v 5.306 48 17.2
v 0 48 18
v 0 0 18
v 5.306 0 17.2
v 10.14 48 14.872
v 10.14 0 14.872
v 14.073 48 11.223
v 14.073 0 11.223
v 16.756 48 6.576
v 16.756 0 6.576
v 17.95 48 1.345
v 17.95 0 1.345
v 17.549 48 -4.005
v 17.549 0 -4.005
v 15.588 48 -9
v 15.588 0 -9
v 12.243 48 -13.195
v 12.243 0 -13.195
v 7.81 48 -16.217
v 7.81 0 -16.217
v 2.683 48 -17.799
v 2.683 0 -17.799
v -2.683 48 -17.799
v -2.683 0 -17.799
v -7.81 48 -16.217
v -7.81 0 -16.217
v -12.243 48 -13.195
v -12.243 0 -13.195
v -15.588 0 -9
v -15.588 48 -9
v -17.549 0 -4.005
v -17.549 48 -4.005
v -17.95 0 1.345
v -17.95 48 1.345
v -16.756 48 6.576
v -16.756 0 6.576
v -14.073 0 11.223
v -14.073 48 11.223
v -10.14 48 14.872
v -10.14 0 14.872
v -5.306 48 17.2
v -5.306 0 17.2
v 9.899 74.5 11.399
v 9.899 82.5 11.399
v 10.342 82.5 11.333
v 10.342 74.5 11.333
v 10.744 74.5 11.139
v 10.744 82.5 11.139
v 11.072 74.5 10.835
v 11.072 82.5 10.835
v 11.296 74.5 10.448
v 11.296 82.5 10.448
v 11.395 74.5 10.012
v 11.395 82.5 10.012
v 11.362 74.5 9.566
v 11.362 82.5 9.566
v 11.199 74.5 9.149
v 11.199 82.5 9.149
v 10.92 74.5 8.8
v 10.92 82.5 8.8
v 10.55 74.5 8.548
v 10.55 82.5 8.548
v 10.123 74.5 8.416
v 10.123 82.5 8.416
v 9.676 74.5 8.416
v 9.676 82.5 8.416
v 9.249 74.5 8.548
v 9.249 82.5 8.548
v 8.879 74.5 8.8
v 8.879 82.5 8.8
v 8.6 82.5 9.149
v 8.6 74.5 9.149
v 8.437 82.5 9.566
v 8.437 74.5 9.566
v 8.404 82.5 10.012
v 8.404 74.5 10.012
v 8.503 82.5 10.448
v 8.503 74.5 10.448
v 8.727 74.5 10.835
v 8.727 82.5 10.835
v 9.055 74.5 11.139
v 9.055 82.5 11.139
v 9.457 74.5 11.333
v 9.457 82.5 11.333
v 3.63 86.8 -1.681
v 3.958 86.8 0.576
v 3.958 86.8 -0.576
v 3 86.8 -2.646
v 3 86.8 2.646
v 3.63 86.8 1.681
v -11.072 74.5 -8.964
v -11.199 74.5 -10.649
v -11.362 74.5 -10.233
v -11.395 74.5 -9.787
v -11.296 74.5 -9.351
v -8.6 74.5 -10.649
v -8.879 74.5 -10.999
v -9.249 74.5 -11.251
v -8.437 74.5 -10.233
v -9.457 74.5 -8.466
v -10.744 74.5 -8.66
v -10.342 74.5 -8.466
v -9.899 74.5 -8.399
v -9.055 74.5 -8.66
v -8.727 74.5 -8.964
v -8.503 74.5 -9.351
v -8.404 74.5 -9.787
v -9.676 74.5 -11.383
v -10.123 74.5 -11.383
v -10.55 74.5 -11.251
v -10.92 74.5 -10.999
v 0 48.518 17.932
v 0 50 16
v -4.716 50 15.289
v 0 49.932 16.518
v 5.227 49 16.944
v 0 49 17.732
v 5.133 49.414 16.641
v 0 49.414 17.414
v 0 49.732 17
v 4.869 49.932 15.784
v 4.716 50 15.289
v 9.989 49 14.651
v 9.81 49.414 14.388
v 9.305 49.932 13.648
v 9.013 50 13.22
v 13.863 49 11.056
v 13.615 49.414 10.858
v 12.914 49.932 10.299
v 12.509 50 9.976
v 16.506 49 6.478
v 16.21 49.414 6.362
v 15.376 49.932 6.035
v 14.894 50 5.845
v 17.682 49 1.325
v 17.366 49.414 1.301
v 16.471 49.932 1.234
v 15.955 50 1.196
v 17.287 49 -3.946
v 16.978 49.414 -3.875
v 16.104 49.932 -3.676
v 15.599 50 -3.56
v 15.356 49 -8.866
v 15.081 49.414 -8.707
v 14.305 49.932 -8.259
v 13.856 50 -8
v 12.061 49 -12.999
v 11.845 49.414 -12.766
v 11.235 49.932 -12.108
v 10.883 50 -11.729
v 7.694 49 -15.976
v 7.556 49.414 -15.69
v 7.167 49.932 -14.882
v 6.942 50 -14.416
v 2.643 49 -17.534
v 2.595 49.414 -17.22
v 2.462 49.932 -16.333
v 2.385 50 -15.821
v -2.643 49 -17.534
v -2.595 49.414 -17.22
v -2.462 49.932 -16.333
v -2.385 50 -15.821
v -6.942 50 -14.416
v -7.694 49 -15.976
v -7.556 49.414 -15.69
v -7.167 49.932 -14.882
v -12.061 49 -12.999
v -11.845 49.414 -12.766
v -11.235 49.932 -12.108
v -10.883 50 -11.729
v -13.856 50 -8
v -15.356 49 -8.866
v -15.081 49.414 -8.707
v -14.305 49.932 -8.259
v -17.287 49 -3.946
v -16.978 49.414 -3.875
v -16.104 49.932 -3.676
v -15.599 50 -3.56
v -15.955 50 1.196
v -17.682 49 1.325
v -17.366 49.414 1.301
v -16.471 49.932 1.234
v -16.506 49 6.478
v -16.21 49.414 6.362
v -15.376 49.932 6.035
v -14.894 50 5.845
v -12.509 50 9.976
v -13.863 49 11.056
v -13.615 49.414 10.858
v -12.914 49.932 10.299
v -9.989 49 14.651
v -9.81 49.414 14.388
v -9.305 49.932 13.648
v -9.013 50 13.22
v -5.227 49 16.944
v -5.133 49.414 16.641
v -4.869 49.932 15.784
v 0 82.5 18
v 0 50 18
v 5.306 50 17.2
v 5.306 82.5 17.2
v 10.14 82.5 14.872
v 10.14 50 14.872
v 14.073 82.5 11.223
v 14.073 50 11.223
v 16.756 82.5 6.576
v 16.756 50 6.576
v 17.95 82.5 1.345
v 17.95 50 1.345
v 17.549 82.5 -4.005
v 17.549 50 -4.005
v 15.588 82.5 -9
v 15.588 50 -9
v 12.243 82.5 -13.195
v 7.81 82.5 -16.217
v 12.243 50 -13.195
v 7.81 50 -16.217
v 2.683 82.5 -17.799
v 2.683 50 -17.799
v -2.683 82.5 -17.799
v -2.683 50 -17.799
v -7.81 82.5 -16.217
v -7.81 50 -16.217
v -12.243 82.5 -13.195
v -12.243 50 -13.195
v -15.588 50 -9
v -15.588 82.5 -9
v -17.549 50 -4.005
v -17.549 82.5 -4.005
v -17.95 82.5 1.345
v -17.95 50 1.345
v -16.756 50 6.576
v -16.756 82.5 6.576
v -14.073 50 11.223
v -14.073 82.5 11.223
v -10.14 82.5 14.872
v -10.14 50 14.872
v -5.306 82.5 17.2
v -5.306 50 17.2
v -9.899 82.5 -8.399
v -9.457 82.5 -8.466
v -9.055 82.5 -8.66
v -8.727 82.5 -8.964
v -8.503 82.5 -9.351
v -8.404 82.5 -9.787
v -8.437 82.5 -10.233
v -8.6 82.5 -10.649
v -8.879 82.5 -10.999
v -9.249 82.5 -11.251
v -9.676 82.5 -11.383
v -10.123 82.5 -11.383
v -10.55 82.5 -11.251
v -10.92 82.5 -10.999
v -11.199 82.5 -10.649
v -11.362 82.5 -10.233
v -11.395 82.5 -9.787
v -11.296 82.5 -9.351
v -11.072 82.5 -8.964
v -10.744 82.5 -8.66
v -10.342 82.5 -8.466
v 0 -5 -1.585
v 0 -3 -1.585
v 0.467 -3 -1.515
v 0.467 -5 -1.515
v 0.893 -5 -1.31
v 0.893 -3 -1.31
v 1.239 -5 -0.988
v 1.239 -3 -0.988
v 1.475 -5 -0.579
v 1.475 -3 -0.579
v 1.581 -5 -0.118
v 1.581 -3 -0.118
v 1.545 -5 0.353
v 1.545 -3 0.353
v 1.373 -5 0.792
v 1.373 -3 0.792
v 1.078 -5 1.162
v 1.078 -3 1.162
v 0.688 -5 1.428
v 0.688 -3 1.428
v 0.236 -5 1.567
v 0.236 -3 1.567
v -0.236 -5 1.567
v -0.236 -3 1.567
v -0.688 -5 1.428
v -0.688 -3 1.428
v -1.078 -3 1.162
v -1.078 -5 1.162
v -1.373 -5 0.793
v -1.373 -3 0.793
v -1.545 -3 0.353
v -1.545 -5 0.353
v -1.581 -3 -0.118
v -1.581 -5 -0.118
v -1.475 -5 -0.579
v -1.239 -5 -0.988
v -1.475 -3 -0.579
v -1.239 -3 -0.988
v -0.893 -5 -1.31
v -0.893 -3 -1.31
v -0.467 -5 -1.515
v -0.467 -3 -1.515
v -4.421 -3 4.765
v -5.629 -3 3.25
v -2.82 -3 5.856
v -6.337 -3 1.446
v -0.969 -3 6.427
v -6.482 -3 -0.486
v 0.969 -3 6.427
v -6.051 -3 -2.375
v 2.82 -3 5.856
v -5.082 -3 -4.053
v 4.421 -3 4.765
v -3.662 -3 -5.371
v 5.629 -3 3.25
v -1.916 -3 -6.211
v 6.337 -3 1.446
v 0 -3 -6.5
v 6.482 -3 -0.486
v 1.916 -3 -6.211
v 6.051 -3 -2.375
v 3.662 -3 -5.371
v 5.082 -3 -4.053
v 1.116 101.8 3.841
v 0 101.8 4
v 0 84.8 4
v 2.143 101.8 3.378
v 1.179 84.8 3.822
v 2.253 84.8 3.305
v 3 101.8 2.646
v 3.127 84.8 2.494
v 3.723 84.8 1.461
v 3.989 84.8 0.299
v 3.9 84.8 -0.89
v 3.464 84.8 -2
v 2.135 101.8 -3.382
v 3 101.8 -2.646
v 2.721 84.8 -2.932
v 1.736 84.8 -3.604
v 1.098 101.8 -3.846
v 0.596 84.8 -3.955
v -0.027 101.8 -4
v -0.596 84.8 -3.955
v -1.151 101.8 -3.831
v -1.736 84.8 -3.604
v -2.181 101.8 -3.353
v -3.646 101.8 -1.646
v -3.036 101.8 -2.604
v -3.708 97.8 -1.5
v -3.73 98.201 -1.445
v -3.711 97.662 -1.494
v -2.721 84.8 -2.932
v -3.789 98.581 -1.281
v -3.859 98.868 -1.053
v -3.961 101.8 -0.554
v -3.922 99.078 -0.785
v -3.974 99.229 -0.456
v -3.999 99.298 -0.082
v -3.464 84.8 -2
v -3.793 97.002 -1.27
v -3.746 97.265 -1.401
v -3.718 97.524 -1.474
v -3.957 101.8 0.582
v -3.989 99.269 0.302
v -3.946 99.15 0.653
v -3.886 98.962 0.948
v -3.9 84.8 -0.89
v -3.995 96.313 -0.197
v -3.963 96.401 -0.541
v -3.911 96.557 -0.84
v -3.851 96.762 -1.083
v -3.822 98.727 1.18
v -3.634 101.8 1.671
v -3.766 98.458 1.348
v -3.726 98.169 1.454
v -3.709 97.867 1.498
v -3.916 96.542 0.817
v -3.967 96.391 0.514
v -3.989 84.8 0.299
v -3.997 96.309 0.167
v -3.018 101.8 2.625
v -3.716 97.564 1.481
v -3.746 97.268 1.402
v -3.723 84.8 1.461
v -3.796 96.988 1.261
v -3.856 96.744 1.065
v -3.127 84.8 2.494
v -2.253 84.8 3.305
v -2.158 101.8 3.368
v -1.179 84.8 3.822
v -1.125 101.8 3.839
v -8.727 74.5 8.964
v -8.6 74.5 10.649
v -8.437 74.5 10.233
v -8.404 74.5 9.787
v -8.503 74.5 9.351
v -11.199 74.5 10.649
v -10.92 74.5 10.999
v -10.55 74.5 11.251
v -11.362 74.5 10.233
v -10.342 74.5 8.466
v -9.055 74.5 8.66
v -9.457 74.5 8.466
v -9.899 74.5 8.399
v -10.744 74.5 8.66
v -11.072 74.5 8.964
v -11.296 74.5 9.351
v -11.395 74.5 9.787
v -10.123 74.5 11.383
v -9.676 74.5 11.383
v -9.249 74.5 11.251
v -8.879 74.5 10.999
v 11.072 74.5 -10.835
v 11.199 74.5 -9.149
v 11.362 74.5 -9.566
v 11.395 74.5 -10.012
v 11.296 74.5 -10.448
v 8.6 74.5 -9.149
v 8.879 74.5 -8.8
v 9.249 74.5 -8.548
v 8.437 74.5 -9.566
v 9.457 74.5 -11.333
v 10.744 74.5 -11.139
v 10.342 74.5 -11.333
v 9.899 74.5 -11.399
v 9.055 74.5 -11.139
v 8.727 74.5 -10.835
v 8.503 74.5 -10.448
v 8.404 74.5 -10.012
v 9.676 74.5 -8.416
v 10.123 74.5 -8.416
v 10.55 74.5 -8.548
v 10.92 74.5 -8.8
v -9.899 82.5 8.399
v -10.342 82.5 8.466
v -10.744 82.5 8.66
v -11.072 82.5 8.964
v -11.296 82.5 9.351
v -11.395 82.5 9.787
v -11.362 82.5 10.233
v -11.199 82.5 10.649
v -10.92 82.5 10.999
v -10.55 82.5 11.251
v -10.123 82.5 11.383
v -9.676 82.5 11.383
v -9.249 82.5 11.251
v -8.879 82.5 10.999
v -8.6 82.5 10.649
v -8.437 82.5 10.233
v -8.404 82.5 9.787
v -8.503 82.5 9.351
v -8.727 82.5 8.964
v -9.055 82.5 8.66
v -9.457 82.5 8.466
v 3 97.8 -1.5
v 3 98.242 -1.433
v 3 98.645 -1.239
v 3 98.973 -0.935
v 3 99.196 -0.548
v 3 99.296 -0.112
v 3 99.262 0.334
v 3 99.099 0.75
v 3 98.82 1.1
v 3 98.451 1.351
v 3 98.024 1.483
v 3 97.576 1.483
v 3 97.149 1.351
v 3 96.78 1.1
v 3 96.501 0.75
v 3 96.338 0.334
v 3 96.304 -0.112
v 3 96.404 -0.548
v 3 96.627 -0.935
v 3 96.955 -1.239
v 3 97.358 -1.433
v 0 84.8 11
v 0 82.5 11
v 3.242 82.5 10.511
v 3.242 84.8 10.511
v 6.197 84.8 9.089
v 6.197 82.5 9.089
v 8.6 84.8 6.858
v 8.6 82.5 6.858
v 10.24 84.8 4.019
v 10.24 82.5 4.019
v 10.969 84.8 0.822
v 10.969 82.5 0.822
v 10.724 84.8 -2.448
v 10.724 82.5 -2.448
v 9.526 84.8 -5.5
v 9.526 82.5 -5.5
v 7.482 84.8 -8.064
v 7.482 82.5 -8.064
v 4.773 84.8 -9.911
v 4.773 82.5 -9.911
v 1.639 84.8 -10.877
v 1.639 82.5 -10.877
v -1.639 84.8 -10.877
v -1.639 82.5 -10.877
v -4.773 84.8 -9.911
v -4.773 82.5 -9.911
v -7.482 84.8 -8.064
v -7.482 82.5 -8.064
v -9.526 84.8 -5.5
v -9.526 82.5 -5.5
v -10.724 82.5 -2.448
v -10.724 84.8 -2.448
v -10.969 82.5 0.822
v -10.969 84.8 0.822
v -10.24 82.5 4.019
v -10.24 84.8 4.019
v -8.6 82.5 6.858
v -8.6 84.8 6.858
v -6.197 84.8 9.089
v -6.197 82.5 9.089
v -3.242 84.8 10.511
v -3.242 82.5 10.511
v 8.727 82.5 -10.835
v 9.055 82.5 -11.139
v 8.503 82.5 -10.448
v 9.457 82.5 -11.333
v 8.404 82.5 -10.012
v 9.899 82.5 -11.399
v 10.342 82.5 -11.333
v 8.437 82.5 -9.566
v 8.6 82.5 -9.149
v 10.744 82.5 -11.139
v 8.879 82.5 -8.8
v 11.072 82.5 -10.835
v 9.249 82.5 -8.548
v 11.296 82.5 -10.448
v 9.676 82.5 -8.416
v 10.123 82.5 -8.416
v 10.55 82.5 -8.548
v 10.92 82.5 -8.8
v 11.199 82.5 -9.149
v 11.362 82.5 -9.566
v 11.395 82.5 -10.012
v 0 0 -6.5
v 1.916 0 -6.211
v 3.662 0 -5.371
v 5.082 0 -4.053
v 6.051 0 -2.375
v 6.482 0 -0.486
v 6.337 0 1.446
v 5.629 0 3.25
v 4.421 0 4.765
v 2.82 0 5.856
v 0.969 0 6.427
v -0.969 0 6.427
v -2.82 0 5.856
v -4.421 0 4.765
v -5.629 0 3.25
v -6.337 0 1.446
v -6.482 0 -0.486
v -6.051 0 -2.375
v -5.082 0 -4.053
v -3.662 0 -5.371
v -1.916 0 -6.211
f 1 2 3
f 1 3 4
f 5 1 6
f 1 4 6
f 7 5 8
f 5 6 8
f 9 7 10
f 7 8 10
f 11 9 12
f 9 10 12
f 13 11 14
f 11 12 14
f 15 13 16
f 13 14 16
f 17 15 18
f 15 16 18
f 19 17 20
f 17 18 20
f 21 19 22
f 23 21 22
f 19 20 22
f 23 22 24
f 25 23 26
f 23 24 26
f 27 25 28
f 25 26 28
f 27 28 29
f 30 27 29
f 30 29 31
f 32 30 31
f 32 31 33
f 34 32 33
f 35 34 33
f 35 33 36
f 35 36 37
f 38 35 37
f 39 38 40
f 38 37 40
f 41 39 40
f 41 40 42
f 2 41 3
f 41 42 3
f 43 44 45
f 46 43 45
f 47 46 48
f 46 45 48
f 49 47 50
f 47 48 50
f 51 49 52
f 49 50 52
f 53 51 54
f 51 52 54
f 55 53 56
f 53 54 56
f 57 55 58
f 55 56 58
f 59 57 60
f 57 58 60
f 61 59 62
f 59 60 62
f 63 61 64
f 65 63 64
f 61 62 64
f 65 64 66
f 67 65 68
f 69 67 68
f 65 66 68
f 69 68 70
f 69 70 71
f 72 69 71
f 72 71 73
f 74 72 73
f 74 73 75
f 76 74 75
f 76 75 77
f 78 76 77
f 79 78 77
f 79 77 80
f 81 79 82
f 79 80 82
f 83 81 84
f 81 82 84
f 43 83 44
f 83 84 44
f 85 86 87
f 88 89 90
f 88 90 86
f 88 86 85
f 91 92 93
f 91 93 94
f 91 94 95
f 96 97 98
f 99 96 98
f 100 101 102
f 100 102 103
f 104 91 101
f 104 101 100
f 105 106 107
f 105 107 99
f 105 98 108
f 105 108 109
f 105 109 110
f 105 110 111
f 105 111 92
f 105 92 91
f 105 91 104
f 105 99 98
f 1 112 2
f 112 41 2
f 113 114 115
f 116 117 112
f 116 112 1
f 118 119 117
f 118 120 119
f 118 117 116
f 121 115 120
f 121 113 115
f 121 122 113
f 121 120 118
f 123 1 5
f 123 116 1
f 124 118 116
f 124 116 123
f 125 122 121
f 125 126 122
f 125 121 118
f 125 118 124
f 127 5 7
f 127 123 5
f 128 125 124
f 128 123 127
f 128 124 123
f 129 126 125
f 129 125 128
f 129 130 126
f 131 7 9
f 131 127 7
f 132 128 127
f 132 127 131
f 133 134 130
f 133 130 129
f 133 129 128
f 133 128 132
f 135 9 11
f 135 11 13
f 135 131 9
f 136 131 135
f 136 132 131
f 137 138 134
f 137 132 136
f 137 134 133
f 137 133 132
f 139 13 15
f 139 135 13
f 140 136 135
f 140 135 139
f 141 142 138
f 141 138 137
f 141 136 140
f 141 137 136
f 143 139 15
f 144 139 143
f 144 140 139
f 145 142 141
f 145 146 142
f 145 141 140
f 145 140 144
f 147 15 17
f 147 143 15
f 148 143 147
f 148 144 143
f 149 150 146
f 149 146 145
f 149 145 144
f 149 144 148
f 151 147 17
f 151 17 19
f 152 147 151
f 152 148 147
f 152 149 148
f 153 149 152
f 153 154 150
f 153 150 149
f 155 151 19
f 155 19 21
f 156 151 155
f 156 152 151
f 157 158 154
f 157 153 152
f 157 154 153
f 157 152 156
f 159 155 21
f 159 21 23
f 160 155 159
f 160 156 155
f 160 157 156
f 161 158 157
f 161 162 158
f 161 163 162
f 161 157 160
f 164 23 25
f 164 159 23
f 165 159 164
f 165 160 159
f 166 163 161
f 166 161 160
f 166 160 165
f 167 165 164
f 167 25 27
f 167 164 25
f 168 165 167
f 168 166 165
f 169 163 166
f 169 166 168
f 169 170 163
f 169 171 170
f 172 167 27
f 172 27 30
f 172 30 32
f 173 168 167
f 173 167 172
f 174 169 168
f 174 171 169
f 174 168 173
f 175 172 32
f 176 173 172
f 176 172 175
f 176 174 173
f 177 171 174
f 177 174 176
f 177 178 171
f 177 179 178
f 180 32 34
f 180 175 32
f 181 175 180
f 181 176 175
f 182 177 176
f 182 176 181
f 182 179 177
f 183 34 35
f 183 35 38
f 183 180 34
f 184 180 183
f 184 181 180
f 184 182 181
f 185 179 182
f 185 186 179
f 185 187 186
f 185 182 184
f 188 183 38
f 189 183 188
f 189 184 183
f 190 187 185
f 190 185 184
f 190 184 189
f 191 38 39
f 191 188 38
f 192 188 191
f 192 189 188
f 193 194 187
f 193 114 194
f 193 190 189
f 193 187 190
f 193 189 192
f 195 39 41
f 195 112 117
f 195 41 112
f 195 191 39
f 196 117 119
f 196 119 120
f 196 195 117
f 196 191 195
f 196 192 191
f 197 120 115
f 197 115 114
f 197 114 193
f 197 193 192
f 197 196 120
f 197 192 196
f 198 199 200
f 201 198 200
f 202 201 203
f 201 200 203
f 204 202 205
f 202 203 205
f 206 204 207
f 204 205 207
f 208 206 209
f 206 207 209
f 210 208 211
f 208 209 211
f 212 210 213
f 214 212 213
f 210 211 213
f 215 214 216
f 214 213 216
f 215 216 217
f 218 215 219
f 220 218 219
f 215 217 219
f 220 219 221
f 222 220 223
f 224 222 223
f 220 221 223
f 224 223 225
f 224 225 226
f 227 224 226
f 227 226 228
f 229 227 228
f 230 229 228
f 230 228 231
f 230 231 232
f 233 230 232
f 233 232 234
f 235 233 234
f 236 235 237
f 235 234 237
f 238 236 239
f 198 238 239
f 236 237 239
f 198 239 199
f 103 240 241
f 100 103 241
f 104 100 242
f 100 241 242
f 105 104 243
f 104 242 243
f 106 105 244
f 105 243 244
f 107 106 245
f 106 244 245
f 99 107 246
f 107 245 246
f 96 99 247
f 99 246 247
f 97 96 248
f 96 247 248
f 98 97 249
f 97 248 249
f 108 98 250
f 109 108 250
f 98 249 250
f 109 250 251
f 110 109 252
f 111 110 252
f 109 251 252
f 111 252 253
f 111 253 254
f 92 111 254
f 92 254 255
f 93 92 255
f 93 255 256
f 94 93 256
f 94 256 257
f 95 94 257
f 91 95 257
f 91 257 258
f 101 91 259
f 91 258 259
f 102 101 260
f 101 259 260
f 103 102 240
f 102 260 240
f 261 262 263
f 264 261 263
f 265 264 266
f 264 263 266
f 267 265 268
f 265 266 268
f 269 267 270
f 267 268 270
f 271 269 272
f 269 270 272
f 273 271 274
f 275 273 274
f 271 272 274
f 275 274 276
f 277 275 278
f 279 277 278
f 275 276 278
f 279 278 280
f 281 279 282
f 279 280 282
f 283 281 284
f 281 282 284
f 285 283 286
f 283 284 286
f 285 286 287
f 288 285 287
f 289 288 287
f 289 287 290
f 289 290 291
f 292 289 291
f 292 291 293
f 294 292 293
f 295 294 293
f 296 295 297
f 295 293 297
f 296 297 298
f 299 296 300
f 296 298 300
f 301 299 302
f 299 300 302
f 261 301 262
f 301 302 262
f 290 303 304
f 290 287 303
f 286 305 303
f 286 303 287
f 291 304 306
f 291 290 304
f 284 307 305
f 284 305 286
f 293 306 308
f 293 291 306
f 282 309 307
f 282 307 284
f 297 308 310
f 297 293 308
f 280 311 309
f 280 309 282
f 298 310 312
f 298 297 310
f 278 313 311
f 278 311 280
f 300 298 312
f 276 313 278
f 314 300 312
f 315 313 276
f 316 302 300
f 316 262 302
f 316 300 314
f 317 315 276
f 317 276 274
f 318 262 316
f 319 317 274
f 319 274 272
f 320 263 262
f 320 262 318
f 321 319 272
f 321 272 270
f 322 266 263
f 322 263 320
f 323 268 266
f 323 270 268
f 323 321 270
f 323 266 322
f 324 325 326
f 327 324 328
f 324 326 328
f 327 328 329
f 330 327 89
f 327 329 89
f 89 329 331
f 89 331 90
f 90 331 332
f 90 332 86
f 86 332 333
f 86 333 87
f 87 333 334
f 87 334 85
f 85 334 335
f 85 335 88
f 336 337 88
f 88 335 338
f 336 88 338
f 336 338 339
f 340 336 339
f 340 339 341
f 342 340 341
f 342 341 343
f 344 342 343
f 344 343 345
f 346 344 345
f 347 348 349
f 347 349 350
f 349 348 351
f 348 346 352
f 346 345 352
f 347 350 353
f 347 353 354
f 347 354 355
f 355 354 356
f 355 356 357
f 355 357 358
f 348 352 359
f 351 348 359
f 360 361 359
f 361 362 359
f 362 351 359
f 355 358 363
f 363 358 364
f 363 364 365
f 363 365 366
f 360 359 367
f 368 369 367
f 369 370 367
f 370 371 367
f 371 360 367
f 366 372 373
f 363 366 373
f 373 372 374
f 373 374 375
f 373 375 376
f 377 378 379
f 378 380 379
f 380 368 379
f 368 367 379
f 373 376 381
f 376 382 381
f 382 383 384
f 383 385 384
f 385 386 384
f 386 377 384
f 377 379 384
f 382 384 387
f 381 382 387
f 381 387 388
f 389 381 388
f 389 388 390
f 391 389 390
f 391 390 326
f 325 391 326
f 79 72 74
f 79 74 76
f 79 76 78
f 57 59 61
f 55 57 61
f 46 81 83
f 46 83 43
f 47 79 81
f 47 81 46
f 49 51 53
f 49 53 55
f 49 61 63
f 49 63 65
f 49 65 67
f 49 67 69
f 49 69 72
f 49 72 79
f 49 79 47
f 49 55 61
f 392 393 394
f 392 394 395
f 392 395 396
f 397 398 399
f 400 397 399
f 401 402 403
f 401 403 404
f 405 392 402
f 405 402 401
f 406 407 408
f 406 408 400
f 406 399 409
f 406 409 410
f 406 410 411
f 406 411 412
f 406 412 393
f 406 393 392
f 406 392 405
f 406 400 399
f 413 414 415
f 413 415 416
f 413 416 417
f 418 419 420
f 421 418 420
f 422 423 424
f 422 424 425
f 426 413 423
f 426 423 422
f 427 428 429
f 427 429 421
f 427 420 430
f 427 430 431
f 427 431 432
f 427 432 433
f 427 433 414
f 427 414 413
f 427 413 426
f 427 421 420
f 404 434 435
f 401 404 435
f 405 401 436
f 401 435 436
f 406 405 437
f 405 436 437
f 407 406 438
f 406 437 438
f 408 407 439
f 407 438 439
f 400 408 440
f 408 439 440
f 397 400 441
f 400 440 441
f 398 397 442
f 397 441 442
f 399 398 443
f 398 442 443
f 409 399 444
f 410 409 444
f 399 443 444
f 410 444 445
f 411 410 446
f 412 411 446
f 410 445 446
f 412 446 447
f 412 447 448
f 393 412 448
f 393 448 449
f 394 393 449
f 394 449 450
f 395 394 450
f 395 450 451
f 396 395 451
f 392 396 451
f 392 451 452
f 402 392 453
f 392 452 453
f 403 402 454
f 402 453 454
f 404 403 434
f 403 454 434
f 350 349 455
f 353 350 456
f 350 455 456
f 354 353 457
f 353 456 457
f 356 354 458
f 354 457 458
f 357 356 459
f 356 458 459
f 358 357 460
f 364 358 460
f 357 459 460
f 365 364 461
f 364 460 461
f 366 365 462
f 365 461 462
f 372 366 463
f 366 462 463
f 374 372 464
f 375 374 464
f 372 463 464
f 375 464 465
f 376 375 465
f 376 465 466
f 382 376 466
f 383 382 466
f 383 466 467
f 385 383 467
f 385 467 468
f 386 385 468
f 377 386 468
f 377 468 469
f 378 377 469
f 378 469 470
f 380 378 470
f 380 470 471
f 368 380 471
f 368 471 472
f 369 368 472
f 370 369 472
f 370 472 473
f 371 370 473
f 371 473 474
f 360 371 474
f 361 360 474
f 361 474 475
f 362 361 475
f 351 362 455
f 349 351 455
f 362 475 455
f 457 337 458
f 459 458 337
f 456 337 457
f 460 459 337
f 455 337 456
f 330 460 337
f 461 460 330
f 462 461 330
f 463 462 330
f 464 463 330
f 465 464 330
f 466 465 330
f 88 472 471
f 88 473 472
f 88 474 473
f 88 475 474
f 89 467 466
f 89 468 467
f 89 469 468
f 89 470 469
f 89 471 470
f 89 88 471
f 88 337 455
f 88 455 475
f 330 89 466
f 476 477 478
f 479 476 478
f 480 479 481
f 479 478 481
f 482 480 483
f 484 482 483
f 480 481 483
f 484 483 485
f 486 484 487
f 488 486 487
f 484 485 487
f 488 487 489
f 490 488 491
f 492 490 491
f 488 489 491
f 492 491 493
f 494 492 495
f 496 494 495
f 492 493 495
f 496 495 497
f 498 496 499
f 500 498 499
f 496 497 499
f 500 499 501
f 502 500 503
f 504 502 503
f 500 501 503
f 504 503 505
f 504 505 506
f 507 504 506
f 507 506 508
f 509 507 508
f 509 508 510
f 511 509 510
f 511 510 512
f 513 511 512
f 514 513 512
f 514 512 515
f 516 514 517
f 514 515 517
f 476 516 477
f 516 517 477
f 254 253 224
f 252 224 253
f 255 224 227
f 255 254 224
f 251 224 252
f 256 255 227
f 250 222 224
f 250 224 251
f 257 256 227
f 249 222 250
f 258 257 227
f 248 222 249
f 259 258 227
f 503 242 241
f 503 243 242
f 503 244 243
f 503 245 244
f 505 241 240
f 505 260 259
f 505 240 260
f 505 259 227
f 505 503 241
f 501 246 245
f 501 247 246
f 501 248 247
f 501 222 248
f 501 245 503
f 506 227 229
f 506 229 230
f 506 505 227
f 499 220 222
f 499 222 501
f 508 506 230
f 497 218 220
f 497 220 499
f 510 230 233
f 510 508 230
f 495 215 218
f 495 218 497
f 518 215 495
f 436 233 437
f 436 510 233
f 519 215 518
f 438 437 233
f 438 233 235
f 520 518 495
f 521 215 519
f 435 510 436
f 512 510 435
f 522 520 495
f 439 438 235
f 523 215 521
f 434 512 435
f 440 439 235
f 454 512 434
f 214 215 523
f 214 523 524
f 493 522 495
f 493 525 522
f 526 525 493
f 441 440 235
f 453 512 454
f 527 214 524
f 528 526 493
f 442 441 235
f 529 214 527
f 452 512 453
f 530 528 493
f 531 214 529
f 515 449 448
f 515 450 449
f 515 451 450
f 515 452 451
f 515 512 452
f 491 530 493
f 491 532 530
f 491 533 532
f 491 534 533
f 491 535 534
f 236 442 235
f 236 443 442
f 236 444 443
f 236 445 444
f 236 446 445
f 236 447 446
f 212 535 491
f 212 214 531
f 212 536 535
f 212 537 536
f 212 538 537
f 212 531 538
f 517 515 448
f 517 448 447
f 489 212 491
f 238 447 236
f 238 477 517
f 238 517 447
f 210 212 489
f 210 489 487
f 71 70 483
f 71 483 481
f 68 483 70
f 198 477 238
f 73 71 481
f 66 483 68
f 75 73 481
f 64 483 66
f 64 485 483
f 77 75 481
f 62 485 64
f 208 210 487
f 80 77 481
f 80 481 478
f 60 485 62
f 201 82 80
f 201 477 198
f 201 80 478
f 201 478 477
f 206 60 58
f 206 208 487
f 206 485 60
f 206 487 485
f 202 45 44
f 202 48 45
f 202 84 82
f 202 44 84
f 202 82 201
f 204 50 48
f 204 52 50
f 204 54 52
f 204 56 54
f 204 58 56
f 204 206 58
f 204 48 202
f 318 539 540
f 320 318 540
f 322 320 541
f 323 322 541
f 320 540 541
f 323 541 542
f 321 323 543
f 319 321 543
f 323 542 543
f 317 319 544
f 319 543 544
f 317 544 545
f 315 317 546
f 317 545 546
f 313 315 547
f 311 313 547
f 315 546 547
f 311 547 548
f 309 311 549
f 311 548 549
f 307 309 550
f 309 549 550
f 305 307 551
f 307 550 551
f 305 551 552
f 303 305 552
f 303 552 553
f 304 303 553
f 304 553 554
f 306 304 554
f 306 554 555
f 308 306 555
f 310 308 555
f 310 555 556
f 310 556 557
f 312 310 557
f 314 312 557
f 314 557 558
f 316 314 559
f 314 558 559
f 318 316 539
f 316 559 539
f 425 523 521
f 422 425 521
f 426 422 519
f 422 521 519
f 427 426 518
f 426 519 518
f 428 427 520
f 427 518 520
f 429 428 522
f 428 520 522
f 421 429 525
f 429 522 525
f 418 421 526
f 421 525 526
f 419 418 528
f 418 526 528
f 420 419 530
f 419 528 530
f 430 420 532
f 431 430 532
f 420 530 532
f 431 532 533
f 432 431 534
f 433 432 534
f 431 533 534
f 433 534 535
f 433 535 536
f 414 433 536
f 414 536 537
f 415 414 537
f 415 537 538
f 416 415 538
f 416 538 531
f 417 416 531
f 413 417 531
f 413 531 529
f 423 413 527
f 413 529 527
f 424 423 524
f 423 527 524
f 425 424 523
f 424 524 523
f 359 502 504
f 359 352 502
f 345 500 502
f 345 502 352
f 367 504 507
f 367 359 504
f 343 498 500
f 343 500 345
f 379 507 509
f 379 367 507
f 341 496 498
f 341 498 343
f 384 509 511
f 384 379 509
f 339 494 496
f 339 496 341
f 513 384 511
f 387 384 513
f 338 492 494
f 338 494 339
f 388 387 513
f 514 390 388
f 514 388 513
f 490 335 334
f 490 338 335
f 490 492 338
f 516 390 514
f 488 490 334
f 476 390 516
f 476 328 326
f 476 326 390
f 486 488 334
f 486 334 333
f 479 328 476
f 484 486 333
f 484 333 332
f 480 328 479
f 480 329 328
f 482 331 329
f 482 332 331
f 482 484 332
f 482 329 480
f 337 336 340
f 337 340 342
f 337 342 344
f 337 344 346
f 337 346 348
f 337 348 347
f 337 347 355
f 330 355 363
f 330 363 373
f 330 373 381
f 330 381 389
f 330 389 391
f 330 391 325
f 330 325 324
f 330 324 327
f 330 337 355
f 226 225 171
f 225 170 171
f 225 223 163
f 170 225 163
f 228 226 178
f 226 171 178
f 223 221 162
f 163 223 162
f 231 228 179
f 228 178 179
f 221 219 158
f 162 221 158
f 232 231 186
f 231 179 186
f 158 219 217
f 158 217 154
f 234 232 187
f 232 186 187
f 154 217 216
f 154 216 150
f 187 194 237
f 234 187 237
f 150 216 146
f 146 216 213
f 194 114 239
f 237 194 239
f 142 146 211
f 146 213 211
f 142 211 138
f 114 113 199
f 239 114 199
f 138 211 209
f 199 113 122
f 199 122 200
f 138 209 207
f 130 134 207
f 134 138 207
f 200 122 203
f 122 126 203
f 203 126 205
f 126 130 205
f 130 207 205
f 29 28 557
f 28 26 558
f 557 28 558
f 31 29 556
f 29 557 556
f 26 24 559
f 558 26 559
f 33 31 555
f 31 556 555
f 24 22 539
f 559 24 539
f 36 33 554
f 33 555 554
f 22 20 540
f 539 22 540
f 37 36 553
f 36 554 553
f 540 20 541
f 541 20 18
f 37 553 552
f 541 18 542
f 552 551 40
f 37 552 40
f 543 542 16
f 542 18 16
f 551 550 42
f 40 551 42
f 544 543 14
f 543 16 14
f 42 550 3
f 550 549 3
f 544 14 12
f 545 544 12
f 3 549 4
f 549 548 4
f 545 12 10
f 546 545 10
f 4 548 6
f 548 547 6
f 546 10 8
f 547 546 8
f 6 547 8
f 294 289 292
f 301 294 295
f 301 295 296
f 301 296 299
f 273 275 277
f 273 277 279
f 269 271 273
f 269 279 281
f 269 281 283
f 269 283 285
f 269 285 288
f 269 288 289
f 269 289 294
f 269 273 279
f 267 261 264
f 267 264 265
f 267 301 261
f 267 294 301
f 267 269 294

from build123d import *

# Parameters (mm, degrees)
SKETCH_3_R          = 18
EXTRUDE_1_DEPTH     = 50
FILLET_2_R          = 2
SKETCH_4_R          = 6.5
EXTRUDE_2_DEPTH     = 3
SKETCH_5_R          = 18
EXTRUDE_3_DEPTH     = 32.5
SKETCH_6_R          = 11
EXTRUDE_4_DEPTH     = 2.3
SKETCH_7_R          = 4
EXTRUDE_5_DEPTH     = 17
CUT_EXTRUDE_START   = -15
CUT_EXTRUDE_1_DEPTH = 15
SKETCH_10_R         = 1.5
CUT_EXTRUDE_2_DEPTH = 8
SKETCH_11_R         = 1.585
EXTRUDE_6_DEPTH     = 2
SKETCH_14_R         = 1.5
CUT_EXTRUDE_3_DEPTH = 7


with BuildPart() as part:
    # 草图3 → 凸台-拉伸1 (new body)
    with BuildSketch(Plane(origin=(0, 0, 0), x_dir=(1, 0, 0), z_dir=(0, 1, 0))):
        with Locations(Location((0, 0, 0), (0, 0, 270))):
            Circle(SKETCH_3_R)
    extrude(amount=EXTRUDE_1_DEPTH)

    # 圆角2
    fillet_2_edges = [part.edges().sort_by_distance(p)[0] for p in [
        (0, 50, -18),
    ]]
    fillet(fillet_2_edges, radius=FILLET_2_R)

    # 草图4 → 凸台-拉伸2 (add)
    with BuildSketch(Plane.XZ):
        with Locations(Location((0, 0, 0), (0, 0, 270))):
            Circle(SKETCH_4_R)
    extrude(amount=EXTRUDE_2_DEPTH)

    # 草图5 → 凸台-拉伸3 (add)
    with BuildSketch(Plane(origin=(0, 50, 0), x_dir=(1, 0, 0), z_dir=(0, 1, 0))):
        with Locations(Location((0, 0, 0), (0, 0, 270))):
            Circle(SKETCH_5_R)
    extrude(amount=EXTRUDE_3_DEPTH)

    # 草图6 → 凸台-拉伸4 (add)
    with BuildSketch(Plane(origin=(0, 82.5, 0), x_dir=(1, 0, 0), z_dir=(0, 1, 0))):
        with Locations(Location((0, 0, 0), (0, 0, 270))):
            Circle(SKETCH_6_R)
    extrude(amount=EXTRUDE_4_DEPTH)

    # 草图7 → 凸台-拉伸5 (add)
    with BuildSketch(Plane(origin=(0, 84.8, 0), x_dir=(1, 0, 0), z_dir=(0, 1, 0))):
        with Locations(Location((0, 0, 0), (0, 0, 270))):
            Circle(SKETCH_7_R)
    extrude(amount=EXTRUDE_5_DEPTH)

    # 草图8 → 切除-拉伸1 (cut)
    with BuildSketch(Plane(origin=(0, 101.8, 0), x_dir=(1, 0, 0), z_dir=(0, 1, 0)).offset(CUT_EXTRUDE_START)):
        with BuildLine():
            Line((3, 2.645751311), (3, -2.645751311))
            ThreePointArc((3, -2.645751311), (4, 0), (3, 2.645751311))
        make_face()
    extrude(amount=CUT_EXTRUDE_1_DEPTH, mode=Mode.SUBTRACT)

    # 草图10 → 切除-拉伸2 (cut)
    with BuildSketch(Plane(origin=(0, 82.5, 0), x_dir=(1, 0, 0), z_dir=(0, 1, 0))):
        with Locations(Location((-9.899494937, 9.899494937, 0), (0, 0, 270))):
            Circle(SKETCH_10_R)
        with Locations(Location((9.899494937, 9.899494937, 0), (0, 0, 90))):
            Circle(SKETCH_10_R)
        with Locations(Location((9.899494937, -9.899494937, 0), (0, 0, 270))):
            Circle(SKETCH_10_R)
        with Locations(Location((-9.899494937, -9.899494937, 0), (0, 0, 90))):
            Circle(SKETCH_10_R)
    extrude(amount=-CUT_EXTRUDE_2_DEPTH, mode=Mode.SUBTRACT)

    # 草图11 → 凸台-拉伸6 (add)
    with BuildSketch(Plane.XZ.offset(3)):
        with Locations(Location((0, 0, 0), (0, 0, 270))):
            Circle(SKETCH_11_R)
    extrude(amount=EXTRUDE_6_DEPTH)

    # 草图14 → 切除-拉伸3 (cut)
    with BuildSketch(Plane(origin=(3, 0, 0), x_dir=(0, 0, -1), z_dir=(1, 0, 0))):
        with Locations((0, 97.8)):
            Circle(SKETCH_14_R)
    extrude(amount=-CUT_EXTRUDE_3_DEPTH, mode=Mode.SUBTRACT)


solid = part.part
